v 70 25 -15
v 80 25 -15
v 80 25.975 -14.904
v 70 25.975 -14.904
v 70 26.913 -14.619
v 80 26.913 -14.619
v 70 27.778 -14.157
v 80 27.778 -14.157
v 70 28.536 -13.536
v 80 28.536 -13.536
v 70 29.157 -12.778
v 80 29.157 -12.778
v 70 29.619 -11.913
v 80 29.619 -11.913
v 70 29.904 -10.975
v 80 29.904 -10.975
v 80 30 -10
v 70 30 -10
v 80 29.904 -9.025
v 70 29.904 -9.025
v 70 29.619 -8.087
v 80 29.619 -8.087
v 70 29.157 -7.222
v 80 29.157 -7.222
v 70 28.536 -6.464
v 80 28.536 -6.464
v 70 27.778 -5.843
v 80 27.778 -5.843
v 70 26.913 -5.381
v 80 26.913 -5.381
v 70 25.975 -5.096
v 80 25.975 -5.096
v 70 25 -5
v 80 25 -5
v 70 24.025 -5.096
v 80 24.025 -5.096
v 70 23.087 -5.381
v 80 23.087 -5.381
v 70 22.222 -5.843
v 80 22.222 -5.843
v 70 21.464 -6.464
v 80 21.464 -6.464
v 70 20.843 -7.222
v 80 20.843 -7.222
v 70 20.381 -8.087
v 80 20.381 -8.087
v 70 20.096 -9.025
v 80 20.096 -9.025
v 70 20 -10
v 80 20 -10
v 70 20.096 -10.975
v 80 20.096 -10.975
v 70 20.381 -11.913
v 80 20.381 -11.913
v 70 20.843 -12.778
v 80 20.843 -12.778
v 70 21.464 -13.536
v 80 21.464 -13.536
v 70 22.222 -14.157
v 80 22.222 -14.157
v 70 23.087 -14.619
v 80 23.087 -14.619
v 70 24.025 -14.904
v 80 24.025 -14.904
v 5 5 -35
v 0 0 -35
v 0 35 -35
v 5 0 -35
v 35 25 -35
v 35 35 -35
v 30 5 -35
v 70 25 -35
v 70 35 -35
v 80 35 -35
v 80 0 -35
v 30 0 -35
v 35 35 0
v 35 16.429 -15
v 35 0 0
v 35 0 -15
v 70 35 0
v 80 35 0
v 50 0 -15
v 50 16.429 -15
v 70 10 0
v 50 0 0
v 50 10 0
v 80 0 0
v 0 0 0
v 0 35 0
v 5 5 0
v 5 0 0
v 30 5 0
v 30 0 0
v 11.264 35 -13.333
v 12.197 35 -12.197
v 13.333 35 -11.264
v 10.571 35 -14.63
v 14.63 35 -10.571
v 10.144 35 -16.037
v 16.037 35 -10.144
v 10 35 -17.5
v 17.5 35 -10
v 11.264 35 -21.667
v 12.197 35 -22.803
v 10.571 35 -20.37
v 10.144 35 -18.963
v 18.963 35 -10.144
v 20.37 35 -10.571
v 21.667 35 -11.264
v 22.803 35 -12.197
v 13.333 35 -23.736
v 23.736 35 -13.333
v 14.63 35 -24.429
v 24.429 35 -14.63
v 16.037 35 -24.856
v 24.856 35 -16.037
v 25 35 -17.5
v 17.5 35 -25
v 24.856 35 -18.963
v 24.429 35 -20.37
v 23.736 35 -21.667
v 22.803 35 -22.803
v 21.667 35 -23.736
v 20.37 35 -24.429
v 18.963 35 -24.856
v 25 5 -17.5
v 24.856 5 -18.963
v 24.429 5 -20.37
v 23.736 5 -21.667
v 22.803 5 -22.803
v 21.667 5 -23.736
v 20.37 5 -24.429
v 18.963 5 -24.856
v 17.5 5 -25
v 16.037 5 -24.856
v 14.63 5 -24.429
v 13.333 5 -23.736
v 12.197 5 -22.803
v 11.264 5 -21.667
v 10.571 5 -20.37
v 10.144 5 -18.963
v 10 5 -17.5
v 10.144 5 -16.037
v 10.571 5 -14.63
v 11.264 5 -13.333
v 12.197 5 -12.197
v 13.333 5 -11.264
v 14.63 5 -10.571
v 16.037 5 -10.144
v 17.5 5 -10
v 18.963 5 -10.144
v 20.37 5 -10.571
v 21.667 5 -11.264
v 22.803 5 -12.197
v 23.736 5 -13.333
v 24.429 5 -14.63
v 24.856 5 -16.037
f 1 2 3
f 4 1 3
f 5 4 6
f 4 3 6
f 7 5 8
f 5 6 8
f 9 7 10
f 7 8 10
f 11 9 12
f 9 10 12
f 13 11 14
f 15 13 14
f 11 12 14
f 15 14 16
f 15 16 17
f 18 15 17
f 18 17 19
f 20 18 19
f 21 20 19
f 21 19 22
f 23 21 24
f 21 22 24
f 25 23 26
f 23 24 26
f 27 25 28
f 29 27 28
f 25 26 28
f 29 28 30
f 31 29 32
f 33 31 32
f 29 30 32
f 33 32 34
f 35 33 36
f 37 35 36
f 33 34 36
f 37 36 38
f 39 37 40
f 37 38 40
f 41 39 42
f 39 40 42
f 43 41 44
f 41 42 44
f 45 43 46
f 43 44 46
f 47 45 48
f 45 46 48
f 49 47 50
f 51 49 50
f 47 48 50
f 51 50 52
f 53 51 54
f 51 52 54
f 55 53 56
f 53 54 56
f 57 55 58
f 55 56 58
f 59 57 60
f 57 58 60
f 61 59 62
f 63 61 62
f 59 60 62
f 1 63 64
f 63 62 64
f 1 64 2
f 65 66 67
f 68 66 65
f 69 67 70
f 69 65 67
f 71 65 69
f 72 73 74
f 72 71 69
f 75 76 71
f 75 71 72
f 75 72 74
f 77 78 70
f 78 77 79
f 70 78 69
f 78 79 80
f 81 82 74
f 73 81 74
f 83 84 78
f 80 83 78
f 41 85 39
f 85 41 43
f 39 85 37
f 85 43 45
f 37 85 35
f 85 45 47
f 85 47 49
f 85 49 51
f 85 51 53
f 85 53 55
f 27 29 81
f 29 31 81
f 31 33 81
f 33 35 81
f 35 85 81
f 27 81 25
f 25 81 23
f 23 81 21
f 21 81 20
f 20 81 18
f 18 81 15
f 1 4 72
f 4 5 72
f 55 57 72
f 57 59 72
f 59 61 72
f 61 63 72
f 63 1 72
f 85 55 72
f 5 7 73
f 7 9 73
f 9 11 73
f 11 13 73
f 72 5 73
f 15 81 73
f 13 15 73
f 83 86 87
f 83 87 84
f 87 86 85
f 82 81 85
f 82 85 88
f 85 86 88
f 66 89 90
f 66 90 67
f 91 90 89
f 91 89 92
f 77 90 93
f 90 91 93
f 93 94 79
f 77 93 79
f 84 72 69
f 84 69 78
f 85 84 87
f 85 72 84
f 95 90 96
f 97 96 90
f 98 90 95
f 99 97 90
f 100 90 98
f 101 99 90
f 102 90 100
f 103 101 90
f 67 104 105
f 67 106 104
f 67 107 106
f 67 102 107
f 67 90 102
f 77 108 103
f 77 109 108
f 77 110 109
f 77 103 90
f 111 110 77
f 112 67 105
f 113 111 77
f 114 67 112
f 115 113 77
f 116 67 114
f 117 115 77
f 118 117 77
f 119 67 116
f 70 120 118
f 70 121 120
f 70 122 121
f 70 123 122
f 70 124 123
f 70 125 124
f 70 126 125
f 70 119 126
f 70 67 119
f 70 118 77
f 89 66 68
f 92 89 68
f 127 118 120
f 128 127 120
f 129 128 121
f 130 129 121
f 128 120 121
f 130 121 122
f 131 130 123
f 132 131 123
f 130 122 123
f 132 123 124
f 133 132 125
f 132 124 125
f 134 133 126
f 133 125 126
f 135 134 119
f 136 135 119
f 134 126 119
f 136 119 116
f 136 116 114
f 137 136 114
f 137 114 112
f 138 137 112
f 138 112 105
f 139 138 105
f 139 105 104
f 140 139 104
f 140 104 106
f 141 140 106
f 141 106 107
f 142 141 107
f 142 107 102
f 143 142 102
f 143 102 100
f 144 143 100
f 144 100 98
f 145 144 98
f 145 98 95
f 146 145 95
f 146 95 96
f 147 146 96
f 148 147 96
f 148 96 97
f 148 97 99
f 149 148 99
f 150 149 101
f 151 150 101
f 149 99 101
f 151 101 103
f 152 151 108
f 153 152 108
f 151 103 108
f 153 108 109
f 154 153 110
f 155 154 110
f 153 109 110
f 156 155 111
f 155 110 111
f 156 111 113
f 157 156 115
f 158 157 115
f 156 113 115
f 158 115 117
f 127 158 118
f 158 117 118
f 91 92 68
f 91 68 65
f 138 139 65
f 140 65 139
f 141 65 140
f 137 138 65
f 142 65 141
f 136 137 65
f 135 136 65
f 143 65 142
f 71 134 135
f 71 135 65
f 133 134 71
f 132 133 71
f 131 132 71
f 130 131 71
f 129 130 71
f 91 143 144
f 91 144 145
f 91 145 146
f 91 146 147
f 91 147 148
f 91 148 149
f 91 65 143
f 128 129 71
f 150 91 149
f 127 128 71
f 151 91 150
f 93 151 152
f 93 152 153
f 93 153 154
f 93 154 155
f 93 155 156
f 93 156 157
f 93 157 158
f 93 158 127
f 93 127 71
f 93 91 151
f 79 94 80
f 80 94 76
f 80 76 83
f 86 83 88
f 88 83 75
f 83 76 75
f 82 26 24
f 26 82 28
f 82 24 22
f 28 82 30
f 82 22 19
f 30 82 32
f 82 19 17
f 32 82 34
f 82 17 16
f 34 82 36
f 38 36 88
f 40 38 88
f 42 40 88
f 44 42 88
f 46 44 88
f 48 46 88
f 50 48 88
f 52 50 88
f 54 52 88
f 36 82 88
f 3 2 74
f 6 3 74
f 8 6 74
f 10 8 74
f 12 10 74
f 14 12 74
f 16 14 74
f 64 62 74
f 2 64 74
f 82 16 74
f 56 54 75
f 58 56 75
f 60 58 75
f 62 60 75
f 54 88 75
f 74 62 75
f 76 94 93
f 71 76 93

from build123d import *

# Parameters (mm, degrees)
SKETCH1_W               = 80
SKETCH1_H               = 35
BOSS_EXTRUDE1_DEPTH     = 35
CUT_EXTRUDE1_DEPTH      = 45
SKETCH3_W               = 35
SKETCH3_H               = 35
BOSS_EXTRUDE2_DEPTH     = 10
SKETCH4_W               = 15
SKETCH4_H               = 15
CUT_EXTRUDE2_DEPTH      = 1
CUT_EXTRUDE2_DEPTH_BACK = 36
SKETCH5_R               = 5
CUT_EXTRUDE3_DEPTH      = 10
SKETCH6_W               = 25
SKETCH6_H               = 5
CUT_EXTRUDE4_DEPTH      = 36
SKETCH7_R               = 7.5
CUT_EXTRUDE5_DEPTH      = 36


with BuildPart() as part:
    # Sketch1 → Boss-Extrude1 (new body)
    with BuildSketch(Plane(origin=(0, 0, 0), x_dir=(1, 0, 0), z_dir=(0, 1, 0))):
        with Locations((40, 17.5)):
            Rectangle(SKETCH1_W, SKETCH1_H)
    extrude(amount=BOSS_EXTRUDE1_DEPTH)

    # Sketch2 → Cut-Extrude1 (cut)
    with BuildSketch(Plane(origin=(80, 0, 0), x_dir=(0, 0, -1), z_dir=(1, 0, 0))):
        Polygon((35, 35), (35, 25), (0, 10), (0, 35), align=None)
    extrude(amount=-CUT_EXTRUDE1_DEPTH, mode=Mode.SUBTRACT)

    # Sketch3 → Boss-Extrude2 (add)
    with BuildSketch(Plane(origin=(80, 0, 0), x_dir=(0, 0, -1), z_dir=(1, 0, 0))):
        with Locations((17.5, 17.5)):
            Rectangle(SKETCH3_W, SKETCH3_H)
    extrude(amount=-BOSS_EXTRUDE2_DEPTH)

    # Sketch4 → Cut-Extrude2 (cut, two sides)
    with BuildSketch(Plane(origin=(0, 0, 0), x_dir=(-1, 0, 0), z_dir=(0, -1, 0))) as cut_extrude2_sk:
        with Locations((-42.5, 7.5)):
            Rectangle(SKETCH4_W, SKETCH4_H)
    extrude(amount=CUT_EXTRUDE2_DEPTH, mode=Mode.SUBTRACT)
    extrude(cut_extrude2_sk.sketch, amount=-CUT_EXTRUDE2_DEPTH_BACK, mode=Mode.SUBTRACT)

    # Sketch5 → Cut-Extrude3 (cut)
    with BuildSketch(Plane(origin=(80, 0, 0), x_dir=(0, 0, -1), z_dir=(1, 0, 0))):
        with Locations((10, 25)):
            Circle(SKETCH5_R)
    extrude(amount=-CUT_EXTRUDE3_DEPTH, mode=Mode.SUBTRACT)

    # Sketch6 → Cut-Extrude4 (cut, through all)
    with BuildSketch(Plane.XY):
        with Locations((17.5, 2.5)):
            Rectangle(SKETCH6_W, SKETCH6_H)
    extrude(amount=-CUT_EXTRUDE4_DEPTH, mode=Mode.SUBTRACT)

    # Sketch7 → Cut-Extrude5 (cut, through all)
    with BuildSketch(Plane(origin=(0, 35, 0), x_dir=(1, 0, 0), z_dir=(0, 1, 0))):
        with Locations((17.5, 17.5)):
            Circle(SKETCH7_R)
    extrude(amount=-CUT_EXTRUDE5_DEPTH, mode=Mode.SUBTRACT)


solid = part.part
